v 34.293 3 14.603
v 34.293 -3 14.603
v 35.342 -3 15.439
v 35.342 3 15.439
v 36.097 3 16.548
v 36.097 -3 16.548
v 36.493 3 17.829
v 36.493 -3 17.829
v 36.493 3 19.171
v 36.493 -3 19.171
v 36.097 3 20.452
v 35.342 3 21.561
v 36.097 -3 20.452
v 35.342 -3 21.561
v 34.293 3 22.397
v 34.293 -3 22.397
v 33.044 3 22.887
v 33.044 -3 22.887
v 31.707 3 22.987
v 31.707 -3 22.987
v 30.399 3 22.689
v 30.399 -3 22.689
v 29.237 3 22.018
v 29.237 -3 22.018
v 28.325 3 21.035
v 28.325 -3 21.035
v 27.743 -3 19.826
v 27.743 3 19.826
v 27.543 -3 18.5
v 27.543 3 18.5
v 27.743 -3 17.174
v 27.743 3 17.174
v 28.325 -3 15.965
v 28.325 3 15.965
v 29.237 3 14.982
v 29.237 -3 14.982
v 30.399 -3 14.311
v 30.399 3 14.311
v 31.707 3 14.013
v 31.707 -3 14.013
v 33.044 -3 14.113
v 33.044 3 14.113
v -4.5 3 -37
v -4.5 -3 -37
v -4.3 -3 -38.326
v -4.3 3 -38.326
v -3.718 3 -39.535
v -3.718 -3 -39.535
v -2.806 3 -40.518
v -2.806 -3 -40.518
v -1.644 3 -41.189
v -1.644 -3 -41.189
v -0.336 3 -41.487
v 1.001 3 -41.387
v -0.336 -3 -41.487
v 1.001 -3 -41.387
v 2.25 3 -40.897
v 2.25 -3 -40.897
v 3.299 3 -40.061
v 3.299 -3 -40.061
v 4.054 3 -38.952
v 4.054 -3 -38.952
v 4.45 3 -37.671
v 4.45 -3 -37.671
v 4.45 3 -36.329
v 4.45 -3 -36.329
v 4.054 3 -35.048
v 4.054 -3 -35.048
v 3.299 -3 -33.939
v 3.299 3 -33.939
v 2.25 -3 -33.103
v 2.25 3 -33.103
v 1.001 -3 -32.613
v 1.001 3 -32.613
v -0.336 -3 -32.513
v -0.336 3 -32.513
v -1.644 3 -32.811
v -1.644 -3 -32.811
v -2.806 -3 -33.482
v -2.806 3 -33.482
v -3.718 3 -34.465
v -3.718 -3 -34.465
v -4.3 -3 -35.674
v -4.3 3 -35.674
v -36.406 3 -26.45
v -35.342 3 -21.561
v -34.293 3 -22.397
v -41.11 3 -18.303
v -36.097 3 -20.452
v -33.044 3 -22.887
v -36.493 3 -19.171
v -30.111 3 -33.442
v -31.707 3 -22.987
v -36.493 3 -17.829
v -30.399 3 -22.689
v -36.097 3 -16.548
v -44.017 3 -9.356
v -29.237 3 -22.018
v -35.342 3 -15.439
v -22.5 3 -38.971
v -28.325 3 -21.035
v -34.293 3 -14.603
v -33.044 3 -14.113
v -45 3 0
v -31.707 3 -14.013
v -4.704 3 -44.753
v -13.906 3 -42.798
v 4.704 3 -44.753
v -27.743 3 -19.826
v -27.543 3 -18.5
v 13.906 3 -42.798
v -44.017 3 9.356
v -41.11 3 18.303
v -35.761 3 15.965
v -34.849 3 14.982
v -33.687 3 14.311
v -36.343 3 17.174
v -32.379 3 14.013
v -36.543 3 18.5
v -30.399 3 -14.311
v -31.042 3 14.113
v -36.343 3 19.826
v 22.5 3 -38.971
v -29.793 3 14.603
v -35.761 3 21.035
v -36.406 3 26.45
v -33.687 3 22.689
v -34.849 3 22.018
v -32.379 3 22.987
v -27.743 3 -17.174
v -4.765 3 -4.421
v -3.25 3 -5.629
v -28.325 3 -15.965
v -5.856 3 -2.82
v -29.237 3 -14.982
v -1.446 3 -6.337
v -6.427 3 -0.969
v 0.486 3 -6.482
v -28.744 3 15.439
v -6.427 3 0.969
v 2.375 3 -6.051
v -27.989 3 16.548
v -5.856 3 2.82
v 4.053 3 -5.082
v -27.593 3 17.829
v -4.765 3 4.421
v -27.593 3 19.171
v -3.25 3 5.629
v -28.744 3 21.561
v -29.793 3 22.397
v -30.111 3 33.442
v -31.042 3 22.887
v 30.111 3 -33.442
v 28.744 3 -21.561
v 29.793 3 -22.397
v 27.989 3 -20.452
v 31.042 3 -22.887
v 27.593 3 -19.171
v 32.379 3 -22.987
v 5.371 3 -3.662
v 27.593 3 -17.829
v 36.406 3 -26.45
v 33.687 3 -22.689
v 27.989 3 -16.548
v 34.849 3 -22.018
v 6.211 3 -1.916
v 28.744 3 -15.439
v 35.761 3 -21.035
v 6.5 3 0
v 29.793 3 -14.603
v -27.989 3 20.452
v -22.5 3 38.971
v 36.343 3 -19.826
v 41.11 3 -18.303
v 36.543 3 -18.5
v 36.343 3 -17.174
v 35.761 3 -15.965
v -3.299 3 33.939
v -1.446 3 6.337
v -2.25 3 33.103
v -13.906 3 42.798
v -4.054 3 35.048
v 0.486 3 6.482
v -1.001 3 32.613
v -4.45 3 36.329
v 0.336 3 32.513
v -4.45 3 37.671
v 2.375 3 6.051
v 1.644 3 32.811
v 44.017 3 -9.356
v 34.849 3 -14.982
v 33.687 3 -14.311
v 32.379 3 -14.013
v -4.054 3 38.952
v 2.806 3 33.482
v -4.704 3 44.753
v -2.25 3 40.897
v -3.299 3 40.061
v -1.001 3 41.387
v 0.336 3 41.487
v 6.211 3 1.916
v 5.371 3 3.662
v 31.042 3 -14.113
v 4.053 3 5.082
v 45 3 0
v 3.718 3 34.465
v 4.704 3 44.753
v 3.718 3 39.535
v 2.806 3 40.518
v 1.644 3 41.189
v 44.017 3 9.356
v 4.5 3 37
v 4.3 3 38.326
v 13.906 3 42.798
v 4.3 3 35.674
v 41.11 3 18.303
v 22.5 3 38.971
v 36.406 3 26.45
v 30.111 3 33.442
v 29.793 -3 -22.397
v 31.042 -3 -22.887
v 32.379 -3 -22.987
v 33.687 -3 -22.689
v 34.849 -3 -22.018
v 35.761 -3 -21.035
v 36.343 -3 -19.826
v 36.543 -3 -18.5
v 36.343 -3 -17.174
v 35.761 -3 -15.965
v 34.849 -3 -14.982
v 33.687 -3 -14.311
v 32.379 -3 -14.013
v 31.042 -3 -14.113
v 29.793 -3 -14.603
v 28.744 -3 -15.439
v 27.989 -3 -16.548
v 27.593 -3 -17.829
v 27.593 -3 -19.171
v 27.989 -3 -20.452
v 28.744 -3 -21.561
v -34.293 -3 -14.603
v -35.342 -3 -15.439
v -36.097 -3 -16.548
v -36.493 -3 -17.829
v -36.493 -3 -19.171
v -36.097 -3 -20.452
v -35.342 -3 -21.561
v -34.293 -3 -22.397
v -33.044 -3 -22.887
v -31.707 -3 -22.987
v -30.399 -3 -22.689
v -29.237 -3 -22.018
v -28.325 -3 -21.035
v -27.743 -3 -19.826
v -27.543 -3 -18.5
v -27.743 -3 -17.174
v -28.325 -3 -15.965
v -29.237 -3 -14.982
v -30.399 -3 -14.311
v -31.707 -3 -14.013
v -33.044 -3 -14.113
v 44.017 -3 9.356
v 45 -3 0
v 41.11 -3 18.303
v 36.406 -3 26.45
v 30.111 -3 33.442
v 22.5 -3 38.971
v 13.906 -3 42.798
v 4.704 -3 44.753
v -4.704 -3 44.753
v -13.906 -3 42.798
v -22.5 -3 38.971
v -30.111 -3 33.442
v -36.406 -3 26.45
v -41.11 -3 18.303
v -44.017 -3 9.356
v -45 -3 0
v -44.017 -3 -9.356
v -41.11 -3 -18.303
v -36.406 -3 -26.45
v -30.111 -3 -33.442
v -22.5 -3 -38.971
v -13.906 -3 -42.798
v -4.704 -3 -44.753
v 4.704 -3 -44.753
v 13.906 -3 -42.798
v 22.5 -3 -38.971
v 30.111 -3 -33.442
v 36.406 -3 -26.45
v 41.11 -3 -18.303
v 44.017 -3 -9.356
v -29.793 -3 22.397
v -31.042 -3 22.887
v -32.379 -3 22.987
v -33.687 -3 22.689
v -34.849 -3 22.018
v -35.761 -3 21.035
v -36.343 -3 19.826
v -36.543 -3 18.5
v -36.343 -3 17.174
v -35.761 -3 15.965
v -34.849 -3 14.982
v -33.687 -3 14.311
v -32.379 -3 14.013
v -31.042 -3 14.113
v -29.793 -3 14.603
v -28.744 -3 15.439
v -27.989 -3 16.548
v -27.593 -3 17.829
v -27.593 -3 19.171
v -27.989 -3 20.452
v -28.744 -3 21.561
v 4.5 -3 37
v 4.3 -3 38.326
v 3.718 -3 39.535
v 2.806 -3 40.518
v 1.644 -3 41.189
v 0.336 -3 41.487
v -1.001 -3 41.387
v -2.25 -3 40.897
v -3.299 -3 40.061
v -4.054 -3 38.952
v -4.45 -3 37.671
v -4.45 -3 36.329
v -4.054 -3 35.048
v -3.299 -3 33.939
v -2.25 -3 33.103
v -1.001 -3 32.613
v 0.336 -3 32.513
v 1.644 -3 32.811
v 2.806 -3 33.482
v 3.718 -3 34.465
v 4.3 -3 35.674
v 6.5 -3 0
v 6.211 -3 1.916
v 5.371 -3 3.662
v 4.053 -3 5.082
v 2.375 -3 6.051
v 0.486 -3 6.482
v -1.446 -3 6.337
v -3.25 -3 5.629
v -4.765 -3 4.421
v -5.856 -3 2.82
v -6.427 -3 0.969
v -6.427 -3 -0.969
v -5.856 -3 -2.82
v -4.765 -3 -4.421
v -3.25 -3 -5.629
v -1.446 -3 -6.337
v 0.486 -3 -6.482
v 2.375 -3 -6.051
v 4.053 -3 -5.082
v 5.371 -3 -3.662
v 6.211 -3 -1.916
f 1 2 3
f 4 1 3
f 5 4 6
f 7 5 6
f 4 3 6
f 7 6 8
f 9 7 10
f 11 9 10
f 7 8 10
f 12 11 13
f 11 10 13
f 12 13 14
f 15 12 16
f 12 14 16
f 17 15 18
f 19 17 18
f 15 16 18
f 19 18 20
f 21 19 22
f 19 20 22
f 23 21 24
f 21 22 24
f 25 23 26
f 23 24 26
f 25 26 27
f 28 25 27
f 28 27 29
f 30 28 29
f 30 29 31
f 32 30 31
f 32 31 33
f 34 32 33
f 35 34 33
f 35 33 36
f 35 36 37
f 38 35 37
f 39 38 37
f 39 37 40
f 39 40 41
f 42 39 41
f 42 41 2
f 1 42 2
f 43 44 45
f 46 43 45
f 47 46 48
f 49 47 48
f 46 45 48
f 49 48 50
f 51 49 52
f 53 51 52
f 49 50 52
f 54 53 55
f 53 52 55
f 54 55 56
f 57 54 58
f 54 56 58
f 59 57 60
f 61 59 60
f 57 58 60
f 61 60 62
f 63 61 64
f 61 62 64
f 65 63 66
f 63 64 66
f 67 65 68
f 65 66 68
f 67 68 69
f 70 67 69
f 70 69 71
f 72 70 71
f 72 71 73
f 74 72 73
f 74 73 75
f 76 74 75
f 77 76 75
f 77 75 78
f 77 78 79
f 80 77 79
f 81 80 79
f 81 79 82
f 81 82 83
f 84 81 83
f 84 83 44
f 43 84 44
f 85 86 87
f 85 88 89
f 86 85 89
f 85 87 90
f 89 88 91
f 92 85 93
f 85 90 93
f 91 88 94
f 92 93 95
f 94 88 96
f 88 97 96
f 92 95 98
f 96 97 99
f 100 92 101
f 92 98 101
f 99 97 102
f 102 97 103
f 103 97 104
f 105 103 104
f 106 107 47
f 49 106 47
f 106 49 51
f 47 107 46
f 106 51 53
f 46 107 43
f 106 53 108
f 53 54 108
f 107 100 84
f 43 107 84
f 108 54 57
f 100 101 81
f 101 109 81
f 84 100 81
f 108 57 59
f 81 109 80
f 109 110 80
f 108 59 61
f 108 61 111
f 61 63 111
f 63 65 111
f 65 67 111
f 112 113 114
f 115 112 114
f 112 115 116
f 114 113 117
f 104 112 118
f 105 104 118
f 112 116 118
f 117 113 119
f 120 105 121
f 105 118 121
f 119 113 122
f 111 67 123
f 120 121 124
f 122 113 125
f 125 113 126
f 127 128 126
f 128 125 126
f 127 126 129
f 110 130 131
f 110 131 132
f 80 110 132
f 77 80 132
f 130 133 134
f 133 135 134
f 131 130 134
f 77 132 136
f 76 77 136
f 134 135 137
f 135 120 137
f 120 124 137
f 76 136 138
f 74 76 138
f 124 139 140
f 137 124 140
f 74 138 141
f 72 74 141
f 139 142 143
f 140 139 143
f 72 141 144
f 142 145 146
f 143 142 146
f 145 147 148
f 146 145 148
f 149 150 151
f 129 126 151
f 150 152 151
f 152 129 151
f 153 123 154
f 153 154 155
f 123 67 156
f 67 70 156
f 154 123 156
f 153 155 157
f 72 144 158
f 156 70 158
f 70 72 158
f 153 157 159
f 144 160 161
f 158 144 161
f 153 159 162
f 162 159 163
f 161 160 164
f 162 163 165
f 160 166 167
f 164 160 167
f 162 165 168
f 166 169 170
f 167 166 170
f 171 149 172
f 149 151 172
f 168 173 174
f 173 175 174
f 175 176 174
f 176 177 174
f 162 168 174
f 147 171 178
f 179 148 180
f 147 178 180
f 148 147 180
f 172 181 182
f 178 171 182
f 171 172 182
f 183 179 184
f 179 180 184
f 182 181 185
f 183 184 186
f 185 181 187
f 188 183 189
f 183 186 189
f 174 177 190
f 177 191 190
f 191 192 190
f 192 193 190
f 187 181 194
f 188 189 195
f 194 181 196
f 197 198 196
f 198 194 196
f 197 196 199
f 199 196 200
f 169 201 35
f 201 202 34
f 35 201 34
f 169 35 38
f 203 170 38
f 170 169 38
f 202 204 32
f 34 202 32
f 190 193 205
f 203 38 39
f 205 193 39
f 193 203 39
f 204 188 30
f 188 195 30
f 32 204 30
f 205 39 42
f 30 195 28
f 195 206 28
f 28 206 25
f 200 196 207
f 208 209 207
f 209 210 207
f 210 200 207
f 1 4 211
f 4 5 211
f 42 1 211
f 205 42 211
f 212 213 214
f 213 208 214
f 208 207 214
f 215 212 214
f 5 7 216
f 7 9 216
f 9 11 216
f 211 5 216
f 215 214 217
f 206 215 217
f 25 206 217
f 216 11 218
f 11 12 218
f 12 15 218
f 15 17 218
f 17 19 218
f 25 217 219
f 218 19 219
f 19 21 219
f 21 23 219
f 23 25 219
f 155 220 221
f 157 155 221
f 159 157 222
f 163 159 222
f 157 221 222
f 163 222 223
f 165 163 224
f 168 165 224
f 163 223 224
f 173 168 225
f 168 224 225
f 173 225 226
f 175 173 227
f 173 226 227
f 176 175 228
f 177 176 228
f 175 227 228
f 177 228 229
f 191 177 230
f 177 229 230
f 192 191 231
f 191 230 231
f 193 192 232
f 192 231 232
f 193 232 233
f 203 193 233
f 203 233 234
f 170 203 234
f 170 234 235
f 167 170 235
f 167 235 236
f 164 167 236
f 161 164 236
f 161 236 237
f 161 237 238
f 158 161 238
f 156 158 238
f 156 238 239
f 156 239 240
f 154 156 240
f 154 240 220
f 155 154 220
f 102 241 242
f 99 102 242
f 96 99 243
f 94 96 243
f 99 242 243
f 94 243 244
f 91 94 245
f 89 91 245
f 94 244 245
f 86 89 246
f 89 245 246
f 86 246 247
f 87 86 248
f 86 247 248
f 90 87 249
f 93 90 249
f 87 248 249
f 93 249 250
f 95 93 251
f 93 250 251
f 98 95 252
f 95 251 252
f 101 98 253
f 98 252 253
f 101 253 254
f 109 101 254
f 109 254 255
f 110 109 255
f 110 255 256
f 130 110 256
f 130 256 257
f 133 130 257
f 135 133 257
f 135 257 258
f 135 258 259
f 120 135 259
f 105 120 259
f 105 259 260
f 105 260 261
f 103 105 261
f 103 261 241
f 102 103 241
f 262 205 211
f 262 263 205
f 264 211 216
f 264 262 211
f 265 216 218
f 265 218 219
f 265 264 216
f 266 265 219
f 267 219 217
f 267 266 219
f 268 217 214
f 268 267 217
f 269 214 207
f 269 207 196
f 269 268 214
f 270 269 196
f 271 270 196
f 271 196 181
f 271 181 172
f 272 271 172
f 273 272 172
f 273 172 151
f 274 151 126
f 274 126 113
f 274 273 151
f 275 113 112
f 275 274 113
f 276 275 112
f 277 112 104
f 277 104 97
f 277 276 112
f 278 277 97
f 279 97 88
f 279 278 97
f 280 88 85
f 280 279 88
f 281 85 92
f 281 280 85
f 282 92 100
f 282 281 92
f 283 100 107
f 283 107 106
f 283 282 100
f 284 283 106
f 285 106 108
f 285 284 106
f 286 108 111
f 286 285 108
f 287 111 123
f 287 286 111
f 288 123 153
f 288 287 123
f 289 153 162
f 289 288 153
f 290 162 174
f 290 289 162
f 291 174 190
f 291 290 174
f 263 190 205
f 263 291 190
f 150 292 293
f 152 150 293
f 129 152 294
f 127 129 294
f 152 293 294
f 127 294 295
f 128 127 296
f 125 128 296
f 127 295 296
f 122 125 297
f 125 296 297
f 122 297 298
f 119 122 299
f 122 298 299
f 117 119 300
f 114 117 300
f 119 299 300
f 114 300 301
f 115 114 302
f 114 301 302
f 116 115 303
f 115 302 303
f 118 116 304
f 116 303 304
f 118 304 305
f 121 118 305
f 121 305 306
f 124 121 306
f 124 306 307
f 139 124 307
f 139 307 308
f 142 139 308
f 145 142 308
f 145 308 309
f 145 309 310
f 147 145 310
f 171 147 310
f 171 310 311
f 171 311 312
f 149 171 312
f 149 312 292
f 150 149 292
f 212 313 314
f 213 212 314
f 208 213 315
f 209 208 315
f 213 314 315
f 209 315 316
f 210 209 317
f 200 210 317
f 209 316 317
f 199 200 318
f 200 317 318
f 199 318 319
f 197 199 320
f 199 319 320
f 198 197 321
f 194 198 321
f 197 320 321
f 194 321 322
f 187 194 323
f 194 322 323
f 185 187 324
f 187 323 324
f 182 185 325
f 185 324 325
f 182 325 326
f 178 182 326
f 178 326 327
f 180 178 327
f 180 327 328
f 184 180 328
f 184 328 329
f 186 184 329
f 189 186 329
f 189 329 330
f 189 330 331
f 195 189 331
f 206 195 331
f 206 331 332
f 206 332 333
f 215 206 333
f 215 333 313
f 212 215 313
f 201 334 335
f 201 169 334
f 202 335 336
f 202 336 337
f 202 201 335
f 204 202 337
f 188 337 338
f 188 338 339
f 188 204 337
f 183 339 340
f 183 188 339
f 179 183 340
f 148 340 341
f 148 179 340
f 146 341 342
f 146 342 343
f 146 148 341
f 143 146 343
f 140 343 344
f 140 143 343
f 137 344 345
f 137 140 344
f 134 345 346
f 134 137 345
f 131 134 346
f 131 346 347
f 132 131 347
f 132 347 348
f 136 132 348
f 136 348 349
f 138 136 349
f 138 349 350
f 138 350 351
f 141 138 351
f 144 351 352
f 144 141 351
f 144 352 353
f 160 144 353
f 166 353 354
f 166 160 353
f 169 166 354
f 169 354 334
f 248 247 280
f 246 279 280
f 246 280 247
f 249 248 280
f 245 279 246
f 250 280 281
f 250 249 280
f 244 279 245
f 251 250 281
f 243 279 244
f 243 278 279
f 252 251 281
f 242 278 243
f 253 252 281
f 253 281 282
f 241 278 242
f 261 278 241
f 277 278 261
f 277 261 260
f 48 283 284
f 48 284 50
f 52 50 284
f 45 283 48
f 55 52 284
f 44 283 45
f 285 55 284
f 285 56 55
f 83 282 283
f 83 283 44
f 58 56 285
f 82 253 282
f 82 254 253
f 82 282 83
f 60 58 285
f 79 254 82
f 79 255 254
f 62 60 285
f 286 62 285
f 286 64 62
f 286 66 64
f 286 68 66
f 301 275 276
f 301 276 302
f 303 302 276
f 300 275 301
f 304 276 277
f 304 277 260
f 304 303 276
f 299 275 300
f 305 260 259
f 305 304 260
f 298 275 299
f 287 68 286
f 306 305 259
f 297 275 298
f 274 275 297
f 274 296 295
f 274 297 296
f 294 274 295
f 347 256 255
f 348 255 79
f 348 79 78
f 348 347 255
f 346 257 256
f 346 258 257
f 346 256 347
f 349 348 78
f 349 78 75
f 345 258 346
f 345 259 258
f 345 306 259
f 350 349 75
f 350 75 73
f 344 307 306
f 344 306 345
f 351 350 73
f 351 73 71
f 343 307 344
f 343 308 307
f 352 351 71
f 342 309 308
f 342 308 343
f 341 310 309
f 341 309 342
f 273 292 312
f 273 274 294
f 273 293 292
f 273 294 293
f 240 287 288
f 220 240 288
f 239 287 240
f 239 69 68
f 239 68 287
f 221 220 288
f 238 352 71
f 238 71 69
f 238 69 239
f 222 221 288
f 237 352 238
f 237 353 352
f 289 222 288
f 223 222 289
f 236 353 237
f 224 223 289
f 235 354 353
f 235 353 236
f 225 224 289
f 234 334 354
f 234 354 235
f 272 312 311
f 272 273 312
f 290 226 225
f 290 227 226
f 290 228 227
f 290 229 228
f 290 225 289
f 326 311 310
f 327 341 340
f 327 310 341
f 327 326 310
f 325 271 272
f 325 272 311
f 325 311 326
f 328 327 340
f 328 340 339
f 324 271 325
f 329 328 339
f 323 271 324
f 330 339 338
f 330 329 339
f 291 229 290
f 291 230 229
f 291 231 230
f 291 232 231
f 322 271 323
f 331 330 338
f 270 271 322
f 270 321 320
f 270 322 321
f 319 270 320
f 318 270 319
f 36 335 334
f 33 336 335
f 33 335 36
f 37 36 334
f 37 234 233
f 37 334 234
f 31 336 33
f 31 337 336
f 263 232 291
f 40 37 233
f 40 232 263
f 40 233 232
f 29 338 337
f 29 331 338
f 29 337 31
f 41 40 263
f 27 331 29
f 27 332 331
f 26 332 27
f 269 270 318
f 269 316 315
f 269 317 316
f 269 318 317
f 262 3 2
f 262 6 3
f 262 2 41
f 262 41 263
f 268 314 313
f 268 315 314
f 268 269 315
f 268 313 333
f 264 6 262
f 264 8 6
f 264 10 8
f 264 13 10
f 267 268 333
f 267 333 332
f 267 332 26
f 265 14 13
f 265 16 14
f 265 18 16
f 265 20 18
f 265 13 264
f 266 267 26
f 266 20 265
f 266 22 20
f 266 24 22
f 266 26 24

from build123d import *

# Parameters (mm, degrees)
F0_R            = 45
F0_R_2          = 6.5
F1_DEPTH        = 3
F2_R            = 4.5
F3_DEPTH        = 25
F3_COPIES_COUNT = 6


# Not quite as in the source:
# - a pattern or mirror of a feature is missing from the dataset's text; its kind, count and spacing are read off the source's solid


with BuildPart() as f1:
    # F0 (on Front) → F1 (new body, symmetric)
    with BuildSketch(Plane.XZ):
        Circle(F0_R)
        Circle(F0_R_2, mode=Mode.SUBTRACT)
    extrude(amount=F1_DEPTH, both=True)

    # F2 (on face) → F3 (cut)
    with BuildSketch(Plane.XZ.offset(3)):
        with Locations((0, 37)):
            Circle(F2_R)
    f3 = extrude(amount=-F3_DEPTH, mode=Mode.SUBTRACT)

    # F3_copies: F3 ×6 about axis
    f3_copies_axis = Axis((0, 0, 0), (0, 1, 0))
    for i in range(1, F3_COPIES_COUNT):
        add(f3.rotate(f3_copies_axis, i * 360 / F3_COPIES_COUNT), mode=Mode.SUBTRACT)


solid = f1.part
